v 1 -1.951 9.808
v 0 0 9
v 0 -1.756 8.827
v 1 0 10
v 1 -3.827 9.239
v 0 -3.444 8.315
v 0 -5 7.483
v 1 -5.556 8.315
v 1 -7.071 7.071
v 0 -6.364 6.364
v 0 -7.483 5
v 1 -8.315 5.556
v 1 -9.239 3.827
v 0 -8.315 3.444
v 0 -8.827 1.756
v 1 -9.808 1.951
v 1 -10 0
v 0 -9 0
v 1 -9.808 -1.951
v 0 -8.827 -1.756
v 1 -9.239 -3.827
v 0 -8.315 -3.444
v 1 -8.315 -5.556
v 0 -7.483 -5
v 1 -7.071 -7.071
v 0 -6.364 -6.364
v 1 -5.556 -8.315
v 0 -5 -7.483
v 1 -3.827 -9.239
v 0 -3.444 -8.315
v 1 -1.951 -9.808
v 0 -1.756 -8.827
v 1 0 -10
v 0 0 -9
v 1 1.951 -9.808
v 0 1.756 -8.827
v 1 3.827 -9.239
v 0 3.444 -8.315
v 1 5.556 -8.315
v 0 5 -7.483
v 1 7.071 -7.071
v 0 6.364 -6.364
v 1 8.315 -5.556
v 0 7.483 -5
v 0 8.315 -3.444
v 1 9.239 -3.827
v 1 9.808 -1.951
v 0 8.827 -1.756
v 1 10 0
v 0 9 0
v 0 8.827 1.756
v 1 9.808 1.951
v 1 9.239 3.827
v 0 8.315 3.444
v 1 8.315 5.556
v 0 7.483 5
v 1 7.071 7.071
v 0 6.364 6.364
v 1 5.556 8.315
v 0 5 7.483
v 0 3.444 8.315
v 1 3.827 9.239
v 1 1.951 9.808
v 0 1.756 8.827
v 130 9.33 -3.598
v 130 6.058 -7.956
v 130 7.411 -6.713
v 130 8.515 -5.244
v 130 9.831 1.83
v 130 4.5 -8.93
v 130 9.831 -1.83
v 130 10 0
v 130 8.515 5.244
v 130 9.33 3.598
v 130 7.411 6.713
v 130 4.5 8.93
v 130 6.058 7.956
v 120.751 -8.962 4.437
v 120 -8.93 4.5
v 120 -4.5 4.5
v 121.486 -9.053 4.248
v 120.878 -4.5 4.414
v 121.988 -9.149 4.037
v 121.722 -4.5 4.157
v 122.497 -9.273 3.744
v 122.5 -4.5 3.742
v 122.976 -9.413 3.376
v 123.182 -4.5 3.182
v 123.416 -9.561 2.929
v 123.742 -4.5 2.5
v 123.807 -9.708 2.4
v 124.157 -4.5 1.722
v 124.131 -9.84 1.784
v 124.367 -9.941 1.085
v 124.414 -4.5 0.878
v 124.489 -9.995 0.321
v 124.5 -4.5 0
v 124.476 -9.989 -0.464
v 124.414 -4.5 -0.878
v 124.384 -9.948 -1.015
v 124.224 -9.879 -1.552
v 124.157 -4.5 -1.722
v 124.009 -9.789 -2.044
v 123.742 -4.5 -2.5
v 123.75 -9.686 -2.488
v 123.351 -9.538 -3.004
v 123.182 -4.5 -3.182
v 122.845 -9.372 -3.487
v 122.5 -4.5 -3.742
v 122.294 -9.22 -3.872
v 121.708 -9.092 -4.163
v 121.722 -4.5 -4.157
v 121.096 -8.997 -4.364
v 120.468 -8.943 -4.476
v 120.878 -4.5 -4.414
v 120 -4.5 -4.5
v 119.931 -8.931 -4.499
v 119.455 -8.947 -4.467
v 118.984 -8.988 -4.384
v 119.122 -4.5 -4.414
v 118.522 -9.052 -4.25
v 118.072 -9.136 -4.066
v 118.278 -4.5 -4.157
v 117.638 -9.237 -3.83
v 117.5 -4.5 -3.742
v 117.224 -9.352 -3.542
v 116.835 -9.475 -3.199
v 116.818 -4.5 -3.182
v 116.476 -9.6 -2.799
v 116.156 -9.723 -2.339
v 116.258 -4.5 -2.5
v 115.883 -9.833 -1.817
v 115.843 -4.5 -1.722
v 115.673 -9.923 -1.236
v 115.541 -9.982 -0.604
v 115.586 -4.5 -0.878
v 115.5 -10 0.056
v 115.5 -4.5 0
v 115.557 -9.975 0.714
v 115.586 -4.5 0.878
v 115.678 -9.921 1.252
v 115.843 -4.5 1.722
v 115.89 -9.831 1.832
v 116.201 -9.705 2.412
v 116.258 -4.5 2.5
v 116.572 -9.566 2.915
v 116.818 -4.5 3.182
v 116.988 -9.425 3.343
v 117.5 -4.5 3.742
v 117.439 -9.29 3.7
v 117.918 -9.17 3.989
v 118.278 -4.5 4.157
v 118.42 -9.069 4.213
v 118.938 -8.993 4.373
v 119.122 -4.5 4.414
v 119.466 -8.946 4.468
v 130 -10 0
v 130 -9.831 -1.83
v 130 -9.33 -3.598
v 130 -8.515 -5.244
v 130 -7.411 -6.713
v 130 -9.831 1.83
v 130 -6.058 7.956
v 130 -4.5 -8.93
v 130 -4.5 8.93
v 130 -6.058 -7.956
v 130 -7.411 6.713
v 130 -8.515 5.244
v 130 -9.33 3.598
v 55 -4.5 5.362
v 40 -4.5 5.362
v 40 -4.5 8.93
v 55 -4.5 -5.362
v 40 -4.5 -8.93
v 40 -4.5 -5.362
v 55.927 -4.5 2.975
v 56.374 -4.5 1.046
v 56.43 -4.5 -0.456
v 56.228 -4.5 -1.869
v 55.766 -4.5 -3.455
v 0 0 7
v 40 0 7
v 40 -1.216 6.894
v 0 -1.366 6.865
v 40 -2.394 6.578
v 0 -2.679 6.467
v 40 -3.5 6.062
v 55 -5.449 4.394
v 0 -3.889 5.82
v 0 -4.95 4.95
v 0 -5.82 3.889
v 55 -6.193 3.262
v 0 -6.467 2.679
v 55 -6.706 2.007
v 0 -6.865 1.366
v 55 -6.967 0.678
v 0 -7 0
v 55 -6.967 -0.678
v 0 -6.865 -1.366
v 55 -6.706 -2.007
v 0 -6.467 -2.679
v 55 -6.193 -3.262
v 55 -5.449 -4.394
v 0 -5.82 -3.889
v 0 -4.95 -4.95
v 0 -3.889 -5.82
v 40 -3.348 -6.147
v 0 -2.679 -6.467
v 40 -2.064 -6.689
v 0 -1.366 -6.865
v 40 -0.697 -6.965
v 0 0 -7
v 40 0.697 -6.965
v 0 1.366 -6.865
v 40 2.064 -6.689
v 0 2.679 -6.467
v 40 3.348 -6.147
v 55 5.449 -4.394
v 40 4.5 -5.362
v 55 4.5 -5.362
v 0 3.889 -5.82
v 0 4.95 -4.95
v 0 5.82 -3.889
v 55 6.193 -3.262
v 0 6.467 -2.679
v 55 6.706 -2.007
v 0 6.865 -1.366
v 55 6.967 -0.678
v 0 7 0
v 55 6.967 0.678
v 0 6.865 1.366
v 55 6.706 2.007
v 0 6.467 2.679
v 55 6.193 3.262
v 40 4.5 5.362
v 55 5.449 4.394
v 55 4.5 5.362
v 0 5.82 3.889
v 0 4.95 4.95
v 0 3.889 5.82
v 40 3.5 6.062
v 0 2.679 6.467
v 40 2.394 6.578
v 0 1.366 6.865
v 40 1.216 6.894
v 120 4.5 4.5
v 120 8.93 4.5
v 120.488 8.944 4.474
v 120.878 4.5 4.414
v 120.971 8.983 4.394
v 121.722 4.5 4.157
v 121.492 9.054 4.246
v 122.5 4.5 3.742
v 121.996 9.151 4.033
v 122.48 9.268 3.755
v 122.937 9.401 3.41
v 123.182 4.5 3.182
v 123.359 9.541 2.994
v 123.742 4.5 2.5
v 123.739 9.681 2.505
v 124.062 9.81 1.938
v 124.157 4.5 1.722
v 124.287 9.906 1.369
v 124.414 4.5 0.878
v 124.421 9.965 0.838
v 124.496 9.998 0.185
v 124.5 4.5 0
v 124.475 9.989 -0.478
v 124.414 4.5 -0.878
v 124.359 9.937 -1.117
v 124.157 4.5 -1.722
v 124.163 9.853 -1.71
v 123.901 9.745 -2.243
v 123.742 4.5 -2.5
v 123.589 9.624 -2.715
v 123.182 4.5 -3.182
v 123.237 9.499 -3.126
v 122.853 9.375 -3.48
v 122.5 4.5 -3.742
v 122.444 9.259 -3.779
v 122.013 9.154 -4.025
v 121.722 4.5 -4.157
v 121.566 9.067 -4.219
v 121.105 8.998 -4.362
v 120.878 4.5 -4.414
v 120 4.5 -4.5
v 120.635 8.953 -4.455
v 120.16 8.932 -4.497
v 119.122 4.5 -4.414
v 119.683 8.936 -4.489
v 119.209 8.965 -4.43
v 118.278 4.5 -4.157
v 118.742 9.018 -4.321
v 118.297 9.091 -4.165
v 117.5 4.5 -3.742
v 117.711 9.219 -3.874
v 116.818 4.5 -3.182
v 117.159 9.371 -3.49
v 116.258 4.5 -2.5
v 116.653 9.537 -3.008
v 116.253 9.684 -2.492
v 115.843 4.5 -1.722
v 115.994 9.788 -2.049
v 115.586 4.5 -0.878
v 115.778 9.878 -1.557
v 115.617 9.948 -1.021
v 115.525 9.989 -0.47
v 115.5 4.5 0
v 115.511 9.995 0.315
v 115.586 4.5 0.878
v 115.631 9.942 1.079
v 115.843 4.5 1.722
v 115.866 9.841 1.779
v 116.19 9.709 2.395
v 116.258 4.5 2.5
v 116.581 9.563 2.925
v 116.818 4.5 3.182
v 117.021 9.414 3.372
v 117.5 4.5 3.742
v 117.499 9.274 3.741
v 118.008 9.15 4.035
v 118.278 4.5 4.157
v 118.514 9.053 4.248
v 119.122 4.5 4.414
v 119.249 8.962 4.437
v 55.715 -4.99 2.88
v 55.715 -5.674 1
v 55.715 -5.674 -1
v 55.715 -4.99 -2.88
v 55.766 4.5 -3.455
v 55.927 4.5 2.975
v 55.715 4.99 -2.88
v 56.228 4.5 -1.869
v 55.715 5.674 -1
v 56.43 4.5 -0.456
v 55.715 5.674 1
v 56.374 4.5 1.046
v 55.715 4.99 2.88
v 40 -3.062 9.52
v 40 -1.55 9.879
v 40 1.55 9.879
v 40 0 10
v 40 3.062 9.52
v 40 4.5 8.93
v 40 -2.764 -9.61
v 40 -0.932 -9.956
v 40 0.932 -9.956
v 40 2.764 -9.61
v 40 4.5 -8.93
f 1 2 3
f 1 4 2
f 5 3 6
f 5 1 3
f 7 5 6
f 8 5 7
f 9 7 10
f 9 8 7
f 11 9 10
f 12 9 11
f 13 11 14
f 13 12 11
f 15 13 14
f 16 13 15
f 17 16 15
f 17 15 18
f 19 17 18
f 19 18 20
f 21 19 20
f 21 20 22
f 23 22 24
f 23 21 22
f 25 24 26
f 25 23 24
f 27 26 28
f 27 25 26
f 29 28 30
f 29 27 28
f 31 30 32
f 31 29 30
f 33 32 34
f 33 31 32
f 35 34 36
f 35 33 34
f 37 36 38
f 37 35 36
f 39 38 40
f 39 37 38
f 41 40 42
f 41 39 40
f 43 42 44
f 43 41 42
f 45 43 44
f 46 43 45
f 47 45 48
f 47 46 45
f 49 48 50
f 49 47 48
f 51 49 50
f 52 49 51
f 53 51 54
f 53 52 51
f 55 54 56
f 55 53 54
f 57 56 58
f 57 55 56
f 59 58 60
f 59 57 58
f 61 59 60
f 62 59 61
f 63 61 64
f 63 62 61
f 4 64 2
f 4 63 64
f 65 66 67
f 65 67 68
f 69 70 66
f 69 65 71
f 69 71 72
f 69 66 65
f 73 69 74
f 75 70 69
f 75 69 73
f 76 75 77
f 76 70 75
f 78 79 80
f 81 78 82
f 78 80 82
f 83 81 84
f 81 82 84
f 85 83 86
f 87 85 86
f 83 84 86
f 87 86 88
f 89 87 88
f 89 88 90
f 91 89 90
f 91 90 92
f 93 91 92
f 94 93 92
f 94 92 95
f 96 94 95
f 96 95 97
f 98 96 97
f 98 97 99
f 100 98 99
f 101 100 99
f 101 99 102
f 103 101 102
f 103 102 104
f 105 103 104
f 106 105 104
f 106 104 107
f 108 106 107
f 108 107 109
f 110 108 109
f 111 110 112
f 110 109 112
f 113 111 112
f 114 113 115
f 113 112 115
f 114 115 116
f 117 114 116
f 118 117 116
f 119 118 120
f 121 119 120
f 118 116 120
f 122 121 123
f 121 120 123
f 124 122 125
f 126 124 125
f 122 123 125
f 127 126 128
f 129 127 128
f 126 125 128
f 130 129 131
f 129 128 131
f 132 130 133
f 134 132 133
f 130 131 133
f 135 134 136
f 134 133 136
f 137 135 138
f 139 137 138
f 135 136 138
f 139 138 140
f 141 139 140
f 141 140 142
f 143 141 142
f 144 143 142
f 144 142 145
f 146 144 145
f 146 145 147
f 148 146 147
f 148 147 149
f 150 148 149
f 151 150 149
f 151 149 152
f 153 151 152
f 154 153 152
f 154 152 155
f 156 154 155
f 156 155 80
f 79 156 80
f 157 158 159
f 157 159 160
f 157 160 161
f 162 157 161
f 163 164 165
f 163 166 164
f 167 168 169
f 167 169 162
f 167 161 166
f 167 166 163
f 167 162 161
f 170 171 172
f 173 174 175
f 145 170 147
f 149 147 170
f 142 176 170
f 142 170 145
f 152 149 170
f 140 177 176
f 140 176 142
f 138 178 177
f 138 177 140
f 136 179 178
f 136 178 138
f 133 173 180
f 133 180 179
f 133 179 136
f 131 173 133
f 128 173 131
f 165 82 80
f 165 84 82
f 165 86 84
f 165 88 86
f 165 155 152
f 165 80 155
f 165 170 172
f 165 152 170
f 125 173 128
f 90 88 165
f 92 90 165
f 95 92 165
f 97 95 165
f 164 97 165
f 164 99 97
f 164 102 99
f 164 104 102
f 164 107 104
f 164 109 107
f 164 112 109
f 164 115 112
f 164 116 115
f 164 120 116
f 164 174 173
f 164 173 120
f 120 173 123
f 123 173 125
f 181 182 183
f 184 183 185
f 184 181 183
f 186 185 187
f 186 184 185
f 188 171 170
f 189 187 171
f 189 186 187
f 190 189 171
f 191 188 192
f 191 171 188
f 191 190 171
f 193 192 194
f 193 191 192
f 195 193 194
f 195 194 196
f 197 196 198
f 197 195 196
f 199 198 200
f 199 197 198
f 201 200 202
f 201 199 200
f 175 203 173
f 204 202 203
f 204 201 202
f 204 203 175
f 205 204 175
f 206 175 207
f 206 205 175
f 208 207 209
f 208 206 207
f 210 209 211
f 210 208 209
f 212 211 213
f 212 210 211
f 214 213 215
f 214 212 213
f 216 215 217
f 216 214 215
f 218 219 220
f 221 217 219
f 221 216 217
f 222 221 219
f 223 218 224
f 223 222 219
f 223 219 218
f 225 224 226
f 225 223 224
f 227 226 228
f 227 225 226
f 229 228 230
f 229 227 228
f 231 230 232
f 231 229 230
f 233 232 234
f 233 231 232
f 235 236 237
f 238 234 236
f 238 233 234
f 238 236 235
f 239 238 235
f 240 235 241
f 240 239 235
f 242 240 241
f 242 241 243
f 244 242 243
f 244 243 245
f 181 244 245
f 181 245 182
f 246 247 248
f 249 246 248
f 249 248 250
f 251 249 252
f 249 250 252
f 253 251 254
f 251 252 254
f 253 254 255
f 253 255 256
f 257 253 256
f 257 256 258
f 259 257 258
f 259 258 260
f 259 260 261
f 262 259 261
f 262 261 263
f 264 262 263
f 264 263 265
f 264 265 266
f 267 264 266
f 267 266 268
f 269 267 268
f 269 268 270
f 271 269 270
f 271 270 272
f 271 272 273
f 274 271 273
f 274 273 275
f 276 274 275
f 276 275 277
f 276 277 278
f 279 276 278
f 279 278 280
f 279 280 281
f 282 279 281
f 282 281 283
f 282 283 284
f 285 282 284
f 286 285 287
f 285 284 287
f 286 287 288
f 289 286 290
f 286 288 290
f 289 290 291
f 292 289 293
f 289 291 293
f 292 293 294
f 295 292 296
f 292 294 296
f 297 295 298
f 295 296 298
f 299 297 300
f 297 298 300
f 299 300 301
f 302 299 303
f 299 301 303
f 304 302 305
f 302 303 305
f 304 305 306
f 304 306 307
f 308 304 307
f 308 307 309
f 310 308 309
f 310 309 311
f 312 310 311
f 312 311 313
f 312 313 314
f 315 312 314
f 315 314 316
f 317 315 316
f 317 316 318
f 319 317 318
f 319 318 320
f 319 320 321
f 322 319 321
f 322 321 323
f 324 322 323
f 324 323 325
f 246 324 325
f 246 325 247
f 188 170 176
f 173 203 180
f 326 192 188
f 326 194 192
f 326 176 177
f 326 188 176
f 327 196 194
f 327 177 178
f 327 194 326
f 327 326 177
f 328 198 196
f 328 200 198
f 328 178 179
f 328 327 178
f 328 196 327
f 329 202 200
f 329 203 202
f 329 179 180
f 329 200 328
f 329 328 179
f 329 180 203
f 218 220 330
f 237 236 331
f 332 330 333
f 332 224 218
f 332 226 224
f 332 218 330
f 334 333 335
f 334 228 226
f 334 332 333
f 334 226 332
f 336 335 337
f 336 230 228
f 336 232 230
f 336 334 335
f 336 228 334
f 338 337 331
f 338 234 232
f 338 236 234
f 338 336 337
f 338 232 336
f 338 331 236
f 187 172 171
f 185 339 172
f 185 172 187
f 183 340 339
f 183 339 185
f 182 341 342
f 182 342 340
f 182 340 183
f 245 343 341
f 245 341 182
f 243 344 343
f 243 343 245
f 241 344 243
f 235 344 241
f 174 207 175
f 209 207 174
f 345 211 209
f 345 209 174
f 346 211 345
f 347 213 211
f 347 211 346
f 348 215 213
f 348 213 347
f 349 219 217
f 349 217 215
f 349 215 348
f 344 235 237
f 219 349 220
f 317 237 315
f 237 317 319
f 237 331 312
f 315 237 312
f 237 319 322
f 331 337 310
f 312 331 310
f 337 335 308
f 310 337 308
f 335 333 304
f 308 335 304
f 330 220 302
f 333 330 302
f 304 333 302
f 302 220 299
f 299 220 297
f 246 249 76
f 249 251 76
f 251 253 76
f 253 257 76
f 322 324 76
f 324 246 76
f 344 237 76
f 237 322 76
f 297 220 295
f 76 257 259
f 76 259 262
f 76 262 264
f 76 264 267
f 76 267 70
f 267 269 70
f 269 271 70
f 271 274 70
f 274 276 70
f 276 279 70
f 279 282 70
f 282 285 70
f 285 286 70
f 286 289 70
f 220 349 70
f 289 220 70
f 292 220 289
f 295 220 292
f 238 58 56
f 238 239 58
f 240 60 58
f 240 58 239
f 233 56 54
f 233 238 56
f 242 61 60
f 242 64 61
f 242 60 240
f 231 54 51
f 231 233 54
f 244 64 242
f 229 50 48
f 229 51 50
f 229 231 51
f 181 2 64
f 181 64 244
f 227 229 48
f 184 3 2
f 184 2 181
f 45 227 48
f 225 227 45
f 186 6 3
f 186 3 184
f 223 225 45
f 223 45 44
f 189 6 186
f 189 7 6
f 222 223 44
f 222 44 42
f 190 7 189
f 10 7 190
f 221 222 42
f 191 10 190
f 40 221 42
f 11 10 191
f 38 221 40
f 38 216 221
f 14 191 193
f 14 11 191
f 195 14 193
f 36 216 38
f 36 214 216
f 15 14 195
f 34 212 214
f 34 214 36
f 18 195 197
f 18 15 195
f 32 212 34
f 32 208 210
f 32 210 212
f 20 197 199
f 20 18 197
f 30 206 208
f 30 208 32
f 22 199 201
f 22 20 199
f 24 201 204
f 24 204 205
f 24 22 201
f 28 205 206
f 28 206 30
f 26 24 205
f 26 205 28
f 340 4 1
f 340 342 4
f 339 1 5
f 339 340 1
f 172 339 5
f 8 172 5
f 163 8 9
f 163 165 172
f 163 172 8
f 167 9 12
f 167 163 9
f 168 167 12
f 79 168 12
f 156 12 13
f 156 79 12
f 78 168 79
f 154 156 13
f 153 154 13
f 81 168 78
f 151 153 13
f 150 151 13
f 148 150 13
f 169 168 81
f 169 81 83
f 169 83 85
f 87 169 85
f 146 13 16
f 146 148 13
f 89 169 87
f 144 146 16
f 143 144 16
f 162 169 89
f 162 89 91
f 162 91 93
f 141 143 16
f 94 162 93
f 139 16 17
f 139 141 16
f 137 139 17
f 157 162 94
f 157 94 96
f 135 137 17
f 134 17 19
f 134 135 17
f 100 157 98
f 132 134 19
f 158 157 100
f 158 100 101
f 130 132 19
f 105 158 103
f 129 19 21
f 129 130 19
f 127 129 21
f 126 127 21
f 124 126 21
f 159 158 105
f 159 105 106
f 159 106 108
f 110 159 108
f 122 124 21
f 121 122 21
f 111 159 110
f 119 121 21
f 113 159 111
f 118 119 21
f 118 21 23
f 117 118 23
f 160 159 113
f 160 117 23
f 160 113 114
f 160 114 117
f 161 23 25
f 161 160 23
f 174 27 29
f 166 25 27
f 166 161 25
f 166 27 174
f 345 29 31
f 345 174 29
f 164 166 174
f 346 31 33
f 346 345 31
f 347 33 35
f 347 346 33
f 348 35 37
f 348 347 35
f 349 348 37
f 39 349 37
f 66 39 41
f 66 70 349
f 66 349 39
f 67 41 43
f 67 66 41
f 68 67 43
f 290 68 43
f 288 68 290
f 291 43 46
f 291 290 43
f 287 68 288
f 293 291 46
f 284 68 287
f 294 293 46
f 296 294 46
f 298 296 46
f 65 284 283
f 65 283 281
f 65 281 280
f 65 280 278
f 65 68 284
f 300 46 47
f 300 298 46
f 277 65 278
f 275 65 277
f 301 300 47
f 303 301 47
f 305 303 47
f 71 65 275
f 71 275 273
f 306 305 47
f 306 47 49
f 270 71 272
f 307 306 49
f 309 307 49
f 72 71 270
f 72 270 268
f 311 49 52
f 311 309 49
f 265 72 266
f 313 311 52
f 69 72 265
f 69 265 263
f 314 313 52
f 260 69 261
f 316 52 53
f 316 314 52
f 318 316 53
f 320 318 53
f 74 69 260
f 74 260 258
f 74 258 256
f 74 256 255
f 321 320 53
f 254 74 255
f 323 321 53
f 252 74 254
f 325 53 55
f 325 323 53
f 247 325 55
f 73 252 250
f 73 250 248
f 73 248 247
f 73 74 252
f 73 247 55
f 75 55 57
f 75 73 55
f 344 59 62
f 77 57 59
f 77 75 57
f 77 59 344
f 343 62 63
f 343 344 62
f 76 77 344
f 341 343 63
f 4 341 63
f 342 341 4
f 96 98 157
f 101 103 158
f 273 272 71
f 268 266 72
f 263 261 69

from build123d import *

# Parameters (mm, degrees)
ESQUISSE2_R             = 4.5
ENL_V_MAT_EXTRU_1_DEPTH = 132.909059583
ESQUISSE3_W             = 90
ESQUISSE3_H             = 20
ENL_V_MAT_EXTRU_2_DEPTH = 4.5


with BuildPart() as part:
    # Esquisse1 → Base-Révolution (revolve)
    with BuildSketch(Plane.XY, mode=Mode.PRIVATE) as base_r_volution_sk:
        Polygon((0, 7), (0, 9), (1, 10), (130, 10), (130, 0), (59.041451884, 0), (55, 7), align=None)
    revolve(base_r_volution_sk.sketch.rotate(Axis((0, 0, 0), (1, 0, 0)), 90), axis=Axis((0, 0, 0), (1, 0, 0)))

    # Esquisse2 → Enlèv. mat.-Extru.1 (cut, through all)
    with BuildSketch(Plane(origin=(0, 10, 0), x_dir=(-1, 0, 0), z_dir=(0, 1, 0))):
        with Locations(Location((-120, 0, 0), (0, 0, 90))):
            Circle(ESQUISSE2_R)
    extrude(amount=-ENL_V_MAT_EXTRU_1_DEPTH, mode=Mode.SUBTRACT)

    # Esquisse3 → Enlèv. mat.-Extru.2 (cut, symmetric)
    with BuildSketch(Plane(origin=(0, 0, 0), x_dir=(1, 0, 0), z_dir=(0, 1, 0))):
        with Locations((85, 0)):
            Rectangle(ESQUISSE3_W, ESQUISSE3_H)
    extrude(amount=ENL_V_MAT_EXTRU_2_DEPTH, both=True, mode=Mode.SUBTRACT)


solid = part.part
